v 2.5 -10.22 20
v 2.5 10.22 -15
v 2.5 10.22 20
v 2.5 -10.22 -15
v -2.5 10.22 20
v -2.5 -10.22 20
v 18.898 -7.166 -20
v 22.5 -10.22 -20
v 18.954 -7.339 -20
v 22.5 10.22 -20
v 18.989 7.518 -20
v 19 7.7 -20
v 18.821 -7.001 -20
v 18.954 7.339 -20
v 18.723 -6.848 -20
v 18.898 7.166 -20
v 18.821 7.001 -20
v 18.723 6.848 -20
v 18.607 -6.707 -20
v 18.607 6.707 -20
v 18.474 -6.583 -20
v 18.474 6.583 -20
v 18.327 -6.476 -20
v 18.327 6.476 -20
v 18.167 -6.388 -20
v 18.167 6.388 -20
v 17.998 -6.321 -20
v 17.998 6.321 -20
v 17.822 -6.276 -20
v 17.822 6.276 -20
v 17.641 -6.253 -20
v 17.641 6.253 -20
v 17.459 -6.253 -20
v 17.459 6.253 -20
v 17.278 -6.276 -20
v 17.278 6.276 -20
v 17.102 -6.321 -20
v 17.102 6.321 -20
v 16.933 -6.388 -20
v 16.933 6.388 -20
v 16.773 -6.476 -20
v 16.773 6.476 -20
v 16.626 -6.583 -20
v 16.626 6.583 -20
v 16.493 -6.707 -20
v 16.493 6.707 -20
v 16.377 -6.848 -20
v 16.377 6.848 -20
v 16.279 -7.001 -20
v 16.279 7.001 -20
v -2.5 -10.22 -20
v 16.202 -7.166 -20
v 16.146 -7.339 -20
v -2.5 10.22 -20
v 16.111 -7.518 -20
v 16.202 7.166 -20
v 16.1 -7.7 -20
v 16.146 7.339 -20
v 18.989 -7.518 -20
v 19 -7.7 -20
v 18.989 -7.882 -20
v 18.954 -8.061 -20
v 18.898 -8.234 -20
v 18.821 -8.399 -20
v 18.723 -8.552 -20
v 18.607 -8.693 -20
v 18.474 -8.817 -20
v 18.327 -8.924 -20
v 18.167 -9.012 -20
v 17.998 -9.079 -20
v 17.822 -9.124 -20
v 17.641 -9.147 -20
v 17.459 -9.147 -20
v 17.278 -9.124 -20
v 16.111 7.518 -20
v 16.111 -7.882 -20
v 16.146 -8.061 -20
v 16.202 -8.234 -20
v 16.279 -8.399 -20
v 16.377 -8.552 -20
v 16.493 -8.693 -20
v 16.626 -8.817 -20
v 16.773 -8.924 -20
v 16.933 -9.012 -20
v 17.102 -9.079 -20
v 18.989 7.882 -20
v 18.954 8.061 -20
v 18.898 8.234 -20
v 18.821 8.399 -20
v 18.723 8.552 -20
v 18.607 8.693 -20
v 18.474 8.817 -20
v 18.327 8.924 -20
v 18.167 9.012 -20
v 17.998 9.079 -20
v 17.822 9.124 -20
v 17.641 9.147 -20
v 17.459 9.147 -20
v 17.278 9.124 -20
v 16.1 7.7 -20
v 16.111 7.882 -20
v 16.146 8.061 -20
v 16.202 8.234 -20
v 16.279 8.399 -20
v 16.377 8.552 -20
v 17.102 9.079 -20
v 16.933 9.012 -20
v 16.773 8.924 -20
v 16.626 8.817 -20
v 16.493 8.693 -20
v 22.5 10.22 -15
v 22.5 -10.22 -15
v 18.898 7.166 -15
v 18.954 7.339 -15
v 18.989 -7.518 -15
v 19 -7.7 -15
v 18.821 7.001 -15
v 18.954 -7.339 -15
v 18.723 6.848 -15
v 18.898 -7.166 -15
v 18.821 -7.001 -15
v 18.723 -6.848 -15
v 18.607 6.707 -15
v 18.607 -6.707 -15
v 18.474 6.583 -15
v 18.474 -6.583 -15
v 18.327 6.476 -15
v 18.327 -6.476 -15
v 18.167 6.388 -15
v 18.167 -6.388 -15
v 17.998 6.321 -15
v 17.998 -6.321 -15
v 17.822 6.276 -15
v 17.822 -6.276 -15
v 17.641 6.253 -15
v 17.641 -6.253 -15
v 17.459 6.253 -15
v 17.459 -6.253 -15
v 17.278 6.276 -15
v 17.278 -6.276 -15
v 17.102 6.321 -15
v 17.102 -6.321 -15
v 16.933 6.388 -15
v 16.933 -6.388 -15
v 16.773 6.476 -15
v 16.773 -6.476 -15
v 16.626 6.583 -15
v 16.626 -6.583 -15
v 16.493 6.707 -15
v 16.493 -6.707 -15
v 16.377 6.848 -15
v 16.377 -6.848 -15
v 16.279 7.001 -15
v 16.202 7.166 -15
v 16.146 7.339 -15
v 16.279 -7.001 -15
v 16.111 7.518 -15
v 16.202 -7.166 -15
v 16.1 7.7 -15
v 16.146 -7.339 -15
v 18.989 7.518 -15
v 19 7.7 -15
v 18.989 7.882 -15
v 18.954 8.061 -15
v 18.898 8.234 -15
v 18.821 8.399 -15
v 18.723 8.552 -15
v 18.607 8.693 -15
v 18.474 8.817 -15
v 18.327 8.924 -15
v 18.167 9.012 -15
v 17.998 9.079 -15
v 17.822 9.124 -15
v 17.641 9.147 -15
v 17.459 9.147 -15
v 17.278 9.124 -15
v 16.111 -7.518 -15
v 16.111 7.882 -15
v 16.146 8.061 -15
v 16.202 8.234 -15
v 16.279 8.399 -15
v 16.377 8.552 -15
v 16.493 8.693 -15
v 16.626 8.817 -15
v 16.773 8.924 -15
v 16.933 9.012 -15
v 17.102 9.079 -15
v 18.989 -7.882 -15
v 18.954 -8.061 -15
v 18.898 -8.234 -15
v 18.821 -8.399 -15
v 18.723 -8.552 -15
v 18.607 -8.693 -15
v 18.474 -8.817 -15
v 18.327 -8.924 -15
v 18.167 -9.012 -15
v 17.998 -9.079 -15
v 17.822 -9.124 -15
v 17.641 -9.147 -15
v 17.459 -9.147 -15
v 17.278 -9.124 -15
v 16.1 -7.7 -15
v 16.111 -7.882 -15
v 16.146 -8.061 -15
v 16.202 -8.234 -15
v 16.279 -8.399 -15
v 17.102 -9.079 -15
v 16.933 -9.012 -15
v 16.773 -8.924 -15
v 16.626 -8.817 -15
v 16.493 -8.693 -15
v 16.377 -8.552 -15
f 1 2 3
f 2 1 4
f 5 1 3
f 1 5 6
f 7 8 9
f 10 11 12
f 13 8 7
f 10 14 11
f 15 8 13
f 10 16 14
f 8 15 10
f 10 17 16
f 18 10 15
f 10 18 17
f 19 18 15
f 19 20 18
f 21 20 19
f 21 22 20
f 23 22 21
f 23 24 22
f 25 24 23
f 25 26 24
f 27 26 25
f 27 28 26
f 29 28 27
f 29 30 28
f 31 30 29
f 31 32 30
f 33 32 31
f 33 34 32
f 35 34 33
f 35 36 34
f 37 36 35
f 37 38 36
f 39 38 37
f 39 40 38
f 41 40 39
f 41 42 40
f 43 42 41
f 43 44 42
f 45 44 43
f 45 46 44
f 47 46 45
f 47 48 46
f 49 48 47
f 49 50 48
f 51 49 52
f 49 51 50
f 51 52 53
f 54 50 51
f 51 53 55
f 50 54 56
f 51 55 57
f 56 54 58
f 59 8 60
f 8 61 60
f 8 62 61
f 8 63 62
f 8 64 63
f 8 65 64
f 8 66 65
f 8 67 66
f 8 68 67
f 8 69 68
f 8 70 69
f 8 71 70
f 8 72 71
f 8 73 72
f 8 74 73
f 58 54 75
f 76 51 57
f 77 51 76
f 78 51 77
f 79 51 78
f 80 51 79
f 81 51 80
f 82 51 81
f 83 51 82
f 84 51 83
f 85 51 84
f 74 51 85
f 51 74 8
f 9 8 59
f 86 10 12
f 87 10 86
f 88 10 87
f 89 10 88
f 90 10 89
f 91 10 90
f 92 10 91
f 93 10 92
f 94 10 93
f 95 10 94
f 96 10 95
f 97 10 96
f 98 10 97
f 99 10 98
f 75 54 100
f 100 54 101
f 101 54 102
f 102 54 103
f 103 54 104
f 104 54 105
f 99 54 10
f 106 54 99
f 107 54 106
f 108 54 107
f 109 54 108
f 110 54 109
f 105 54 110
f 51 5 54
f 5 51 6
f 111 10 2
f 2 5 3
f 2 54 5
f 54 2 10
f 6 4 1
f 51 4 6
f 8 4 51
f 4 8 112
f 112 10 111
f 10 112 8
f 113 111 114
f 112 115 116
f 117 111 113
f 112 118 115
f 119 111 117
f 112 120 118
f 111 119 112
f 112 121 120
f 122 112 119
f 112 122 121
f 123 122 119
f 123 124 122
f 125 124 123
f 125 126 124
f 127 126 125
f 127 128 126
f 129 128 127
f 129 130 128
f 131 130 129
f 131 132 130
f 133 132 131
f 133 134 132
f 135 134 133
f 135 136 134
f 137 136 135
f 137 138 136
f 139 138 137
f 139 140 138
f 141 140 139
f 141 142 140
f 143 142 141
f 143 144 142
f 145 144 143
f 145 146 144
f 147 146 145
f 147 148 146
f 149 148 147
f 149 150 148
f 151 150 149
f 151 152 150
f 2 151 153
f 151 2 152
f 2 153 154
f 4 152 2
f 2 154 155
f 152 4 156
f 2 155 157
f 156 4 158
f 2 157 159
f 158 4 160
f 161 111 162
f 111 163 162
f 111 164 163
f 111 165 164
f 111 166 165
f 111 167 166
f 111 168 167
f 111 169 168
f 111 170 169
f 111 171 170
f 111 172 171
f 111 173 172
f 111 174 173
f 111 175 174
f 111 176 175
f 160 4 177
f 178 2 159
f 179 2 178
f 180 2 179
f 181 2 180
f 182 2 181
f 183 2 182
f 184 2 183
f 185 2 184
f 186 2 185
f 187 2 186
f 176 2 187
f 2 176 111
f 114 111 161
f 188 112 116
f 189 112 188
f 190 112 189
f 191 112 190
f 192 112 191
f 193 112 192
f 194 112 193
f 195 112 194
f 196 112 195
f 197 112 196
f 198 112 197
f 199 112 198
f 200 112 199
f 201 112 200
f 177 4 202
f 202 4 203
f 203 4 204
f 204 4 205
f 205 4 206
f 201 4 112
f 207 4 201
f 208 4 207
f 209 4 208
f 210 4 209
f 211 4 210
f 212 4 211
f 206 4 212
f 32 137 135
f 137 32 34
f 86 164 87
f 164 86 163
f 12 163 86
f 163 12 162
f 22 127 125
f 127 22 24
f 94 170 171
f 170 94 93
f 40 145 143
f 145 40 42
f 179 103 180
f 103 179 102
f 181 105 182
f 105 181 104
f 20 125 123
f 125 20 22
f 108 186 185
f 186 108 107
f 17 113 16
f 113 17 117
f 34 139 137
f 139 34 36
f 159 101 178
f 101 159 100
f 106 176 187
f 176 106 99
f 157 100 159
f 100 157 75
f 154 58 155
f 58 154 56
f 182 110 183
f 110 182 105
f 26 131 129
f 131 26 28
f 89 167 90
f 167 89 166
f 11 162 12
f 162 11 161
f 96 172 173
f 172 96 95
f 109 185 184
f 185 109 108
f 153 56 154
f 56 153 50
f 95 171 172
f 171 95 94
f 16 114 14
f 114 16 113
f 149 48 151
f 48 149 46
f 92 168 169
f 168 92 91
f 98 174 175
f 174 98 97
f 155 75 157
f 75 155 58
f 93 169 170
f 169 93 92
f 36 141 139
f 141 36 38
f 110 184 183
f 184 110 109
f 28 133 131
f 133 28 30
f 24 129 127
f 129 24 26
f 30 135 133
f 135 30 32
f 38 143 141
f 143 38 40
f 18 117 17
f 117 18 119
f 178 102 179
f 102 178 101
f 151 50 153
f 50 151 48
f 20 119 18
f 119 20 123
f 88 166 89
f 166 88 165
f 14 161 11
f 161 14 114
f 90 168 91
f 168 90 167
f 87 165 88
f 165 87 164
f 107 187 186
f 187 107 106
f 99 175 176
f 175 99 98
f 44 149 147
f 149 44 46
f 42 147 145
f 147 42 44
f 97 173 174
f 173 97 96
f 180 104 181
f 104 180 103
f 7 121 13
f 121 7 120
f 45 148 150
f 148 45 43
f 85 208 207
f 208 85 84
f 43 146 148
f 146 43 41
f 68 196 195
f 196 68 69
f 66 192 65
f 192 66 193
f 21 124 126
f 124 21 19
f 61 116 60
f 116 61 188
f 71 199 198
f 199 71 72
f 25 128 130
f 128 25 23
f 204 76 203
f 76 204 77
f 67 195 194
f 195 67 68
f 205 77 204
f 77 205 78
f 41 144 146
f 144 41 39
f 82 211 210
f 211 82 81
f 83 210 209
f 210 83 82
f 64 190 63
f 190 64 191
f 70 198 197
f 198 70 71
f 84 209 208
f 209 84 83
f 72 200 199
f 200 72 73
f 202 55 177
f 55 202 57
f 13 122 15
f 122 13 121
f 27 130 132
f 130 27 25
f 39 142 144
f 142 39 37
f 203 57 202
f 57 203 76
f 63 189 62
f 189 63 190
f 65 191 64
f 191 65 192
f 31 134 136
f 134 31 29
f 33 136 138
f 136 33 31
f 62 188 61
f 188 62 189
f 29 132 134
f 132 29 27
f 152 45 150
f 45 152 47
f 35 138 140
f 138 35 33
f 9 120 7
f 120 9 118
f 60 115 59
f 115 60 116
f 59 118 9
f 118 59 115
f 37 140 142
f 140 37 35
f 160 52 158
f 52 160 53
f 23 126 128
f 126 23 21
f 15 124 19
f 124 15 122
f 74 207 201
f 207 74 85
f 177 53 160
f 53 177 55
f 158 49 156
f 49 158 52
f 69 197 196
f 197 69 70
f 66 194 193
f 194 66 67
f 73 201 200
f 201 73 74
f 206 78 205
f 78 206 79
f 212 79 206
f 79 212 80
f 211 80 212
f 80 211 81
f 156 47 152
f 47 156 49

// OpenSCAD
//RGB
RGBlength = 20.44;
RGBdiameter = 2.9;
RGBradius = RGBdiameter/2;
RGBA = 12.5;
RGBdistance = RGBA/2;
RGBB = 1.0;

//RGB attachment
RAwidth = RGBlength; //y-axis
RAheight = 15.0;  //z-axis
RAdepth = 5.0; //x-axis

//RGB board
RBwidth = RAwidth; //y
RBdepth = RAdepth; //x
RBheight = 40.0;  //depending on the desired distance between RGB and the ground. z

//the part that's attached to the RGB
RB2height = RBdepth; //z
RB2length = 20.0; //x. depending on the distance
RB2width = RBwidth; //y

module cube_true(x, y, z){
    cube(size = [x, y, z], center = true);
}

module cylinder_base(x,y){
    cylinder(h=x,r=y,center=true,$fn=50);
}

difference(){
    union(){
    cube_true(RBdepth,RBwidth,RBheight);
    translate([RBdepth/2+RB2length/2,0,-RBheight/2+RB2height/2]) cube_true(RB2length,RB2width,RB2height);
    }
    translate([RB2length-RGBB-RGBradius,RGBdistance+RGBradius,-RBheight/2+RB2height/2])cylinder_base(RB2height,RGBradius);
    mirror([0,1,0]) translate([RB2length-RGBB-RGBradius,RGBdistance+RGBradius,-RBheight/2+RB2height/2])cylinder_base(RB2height,RGBradius);
}
